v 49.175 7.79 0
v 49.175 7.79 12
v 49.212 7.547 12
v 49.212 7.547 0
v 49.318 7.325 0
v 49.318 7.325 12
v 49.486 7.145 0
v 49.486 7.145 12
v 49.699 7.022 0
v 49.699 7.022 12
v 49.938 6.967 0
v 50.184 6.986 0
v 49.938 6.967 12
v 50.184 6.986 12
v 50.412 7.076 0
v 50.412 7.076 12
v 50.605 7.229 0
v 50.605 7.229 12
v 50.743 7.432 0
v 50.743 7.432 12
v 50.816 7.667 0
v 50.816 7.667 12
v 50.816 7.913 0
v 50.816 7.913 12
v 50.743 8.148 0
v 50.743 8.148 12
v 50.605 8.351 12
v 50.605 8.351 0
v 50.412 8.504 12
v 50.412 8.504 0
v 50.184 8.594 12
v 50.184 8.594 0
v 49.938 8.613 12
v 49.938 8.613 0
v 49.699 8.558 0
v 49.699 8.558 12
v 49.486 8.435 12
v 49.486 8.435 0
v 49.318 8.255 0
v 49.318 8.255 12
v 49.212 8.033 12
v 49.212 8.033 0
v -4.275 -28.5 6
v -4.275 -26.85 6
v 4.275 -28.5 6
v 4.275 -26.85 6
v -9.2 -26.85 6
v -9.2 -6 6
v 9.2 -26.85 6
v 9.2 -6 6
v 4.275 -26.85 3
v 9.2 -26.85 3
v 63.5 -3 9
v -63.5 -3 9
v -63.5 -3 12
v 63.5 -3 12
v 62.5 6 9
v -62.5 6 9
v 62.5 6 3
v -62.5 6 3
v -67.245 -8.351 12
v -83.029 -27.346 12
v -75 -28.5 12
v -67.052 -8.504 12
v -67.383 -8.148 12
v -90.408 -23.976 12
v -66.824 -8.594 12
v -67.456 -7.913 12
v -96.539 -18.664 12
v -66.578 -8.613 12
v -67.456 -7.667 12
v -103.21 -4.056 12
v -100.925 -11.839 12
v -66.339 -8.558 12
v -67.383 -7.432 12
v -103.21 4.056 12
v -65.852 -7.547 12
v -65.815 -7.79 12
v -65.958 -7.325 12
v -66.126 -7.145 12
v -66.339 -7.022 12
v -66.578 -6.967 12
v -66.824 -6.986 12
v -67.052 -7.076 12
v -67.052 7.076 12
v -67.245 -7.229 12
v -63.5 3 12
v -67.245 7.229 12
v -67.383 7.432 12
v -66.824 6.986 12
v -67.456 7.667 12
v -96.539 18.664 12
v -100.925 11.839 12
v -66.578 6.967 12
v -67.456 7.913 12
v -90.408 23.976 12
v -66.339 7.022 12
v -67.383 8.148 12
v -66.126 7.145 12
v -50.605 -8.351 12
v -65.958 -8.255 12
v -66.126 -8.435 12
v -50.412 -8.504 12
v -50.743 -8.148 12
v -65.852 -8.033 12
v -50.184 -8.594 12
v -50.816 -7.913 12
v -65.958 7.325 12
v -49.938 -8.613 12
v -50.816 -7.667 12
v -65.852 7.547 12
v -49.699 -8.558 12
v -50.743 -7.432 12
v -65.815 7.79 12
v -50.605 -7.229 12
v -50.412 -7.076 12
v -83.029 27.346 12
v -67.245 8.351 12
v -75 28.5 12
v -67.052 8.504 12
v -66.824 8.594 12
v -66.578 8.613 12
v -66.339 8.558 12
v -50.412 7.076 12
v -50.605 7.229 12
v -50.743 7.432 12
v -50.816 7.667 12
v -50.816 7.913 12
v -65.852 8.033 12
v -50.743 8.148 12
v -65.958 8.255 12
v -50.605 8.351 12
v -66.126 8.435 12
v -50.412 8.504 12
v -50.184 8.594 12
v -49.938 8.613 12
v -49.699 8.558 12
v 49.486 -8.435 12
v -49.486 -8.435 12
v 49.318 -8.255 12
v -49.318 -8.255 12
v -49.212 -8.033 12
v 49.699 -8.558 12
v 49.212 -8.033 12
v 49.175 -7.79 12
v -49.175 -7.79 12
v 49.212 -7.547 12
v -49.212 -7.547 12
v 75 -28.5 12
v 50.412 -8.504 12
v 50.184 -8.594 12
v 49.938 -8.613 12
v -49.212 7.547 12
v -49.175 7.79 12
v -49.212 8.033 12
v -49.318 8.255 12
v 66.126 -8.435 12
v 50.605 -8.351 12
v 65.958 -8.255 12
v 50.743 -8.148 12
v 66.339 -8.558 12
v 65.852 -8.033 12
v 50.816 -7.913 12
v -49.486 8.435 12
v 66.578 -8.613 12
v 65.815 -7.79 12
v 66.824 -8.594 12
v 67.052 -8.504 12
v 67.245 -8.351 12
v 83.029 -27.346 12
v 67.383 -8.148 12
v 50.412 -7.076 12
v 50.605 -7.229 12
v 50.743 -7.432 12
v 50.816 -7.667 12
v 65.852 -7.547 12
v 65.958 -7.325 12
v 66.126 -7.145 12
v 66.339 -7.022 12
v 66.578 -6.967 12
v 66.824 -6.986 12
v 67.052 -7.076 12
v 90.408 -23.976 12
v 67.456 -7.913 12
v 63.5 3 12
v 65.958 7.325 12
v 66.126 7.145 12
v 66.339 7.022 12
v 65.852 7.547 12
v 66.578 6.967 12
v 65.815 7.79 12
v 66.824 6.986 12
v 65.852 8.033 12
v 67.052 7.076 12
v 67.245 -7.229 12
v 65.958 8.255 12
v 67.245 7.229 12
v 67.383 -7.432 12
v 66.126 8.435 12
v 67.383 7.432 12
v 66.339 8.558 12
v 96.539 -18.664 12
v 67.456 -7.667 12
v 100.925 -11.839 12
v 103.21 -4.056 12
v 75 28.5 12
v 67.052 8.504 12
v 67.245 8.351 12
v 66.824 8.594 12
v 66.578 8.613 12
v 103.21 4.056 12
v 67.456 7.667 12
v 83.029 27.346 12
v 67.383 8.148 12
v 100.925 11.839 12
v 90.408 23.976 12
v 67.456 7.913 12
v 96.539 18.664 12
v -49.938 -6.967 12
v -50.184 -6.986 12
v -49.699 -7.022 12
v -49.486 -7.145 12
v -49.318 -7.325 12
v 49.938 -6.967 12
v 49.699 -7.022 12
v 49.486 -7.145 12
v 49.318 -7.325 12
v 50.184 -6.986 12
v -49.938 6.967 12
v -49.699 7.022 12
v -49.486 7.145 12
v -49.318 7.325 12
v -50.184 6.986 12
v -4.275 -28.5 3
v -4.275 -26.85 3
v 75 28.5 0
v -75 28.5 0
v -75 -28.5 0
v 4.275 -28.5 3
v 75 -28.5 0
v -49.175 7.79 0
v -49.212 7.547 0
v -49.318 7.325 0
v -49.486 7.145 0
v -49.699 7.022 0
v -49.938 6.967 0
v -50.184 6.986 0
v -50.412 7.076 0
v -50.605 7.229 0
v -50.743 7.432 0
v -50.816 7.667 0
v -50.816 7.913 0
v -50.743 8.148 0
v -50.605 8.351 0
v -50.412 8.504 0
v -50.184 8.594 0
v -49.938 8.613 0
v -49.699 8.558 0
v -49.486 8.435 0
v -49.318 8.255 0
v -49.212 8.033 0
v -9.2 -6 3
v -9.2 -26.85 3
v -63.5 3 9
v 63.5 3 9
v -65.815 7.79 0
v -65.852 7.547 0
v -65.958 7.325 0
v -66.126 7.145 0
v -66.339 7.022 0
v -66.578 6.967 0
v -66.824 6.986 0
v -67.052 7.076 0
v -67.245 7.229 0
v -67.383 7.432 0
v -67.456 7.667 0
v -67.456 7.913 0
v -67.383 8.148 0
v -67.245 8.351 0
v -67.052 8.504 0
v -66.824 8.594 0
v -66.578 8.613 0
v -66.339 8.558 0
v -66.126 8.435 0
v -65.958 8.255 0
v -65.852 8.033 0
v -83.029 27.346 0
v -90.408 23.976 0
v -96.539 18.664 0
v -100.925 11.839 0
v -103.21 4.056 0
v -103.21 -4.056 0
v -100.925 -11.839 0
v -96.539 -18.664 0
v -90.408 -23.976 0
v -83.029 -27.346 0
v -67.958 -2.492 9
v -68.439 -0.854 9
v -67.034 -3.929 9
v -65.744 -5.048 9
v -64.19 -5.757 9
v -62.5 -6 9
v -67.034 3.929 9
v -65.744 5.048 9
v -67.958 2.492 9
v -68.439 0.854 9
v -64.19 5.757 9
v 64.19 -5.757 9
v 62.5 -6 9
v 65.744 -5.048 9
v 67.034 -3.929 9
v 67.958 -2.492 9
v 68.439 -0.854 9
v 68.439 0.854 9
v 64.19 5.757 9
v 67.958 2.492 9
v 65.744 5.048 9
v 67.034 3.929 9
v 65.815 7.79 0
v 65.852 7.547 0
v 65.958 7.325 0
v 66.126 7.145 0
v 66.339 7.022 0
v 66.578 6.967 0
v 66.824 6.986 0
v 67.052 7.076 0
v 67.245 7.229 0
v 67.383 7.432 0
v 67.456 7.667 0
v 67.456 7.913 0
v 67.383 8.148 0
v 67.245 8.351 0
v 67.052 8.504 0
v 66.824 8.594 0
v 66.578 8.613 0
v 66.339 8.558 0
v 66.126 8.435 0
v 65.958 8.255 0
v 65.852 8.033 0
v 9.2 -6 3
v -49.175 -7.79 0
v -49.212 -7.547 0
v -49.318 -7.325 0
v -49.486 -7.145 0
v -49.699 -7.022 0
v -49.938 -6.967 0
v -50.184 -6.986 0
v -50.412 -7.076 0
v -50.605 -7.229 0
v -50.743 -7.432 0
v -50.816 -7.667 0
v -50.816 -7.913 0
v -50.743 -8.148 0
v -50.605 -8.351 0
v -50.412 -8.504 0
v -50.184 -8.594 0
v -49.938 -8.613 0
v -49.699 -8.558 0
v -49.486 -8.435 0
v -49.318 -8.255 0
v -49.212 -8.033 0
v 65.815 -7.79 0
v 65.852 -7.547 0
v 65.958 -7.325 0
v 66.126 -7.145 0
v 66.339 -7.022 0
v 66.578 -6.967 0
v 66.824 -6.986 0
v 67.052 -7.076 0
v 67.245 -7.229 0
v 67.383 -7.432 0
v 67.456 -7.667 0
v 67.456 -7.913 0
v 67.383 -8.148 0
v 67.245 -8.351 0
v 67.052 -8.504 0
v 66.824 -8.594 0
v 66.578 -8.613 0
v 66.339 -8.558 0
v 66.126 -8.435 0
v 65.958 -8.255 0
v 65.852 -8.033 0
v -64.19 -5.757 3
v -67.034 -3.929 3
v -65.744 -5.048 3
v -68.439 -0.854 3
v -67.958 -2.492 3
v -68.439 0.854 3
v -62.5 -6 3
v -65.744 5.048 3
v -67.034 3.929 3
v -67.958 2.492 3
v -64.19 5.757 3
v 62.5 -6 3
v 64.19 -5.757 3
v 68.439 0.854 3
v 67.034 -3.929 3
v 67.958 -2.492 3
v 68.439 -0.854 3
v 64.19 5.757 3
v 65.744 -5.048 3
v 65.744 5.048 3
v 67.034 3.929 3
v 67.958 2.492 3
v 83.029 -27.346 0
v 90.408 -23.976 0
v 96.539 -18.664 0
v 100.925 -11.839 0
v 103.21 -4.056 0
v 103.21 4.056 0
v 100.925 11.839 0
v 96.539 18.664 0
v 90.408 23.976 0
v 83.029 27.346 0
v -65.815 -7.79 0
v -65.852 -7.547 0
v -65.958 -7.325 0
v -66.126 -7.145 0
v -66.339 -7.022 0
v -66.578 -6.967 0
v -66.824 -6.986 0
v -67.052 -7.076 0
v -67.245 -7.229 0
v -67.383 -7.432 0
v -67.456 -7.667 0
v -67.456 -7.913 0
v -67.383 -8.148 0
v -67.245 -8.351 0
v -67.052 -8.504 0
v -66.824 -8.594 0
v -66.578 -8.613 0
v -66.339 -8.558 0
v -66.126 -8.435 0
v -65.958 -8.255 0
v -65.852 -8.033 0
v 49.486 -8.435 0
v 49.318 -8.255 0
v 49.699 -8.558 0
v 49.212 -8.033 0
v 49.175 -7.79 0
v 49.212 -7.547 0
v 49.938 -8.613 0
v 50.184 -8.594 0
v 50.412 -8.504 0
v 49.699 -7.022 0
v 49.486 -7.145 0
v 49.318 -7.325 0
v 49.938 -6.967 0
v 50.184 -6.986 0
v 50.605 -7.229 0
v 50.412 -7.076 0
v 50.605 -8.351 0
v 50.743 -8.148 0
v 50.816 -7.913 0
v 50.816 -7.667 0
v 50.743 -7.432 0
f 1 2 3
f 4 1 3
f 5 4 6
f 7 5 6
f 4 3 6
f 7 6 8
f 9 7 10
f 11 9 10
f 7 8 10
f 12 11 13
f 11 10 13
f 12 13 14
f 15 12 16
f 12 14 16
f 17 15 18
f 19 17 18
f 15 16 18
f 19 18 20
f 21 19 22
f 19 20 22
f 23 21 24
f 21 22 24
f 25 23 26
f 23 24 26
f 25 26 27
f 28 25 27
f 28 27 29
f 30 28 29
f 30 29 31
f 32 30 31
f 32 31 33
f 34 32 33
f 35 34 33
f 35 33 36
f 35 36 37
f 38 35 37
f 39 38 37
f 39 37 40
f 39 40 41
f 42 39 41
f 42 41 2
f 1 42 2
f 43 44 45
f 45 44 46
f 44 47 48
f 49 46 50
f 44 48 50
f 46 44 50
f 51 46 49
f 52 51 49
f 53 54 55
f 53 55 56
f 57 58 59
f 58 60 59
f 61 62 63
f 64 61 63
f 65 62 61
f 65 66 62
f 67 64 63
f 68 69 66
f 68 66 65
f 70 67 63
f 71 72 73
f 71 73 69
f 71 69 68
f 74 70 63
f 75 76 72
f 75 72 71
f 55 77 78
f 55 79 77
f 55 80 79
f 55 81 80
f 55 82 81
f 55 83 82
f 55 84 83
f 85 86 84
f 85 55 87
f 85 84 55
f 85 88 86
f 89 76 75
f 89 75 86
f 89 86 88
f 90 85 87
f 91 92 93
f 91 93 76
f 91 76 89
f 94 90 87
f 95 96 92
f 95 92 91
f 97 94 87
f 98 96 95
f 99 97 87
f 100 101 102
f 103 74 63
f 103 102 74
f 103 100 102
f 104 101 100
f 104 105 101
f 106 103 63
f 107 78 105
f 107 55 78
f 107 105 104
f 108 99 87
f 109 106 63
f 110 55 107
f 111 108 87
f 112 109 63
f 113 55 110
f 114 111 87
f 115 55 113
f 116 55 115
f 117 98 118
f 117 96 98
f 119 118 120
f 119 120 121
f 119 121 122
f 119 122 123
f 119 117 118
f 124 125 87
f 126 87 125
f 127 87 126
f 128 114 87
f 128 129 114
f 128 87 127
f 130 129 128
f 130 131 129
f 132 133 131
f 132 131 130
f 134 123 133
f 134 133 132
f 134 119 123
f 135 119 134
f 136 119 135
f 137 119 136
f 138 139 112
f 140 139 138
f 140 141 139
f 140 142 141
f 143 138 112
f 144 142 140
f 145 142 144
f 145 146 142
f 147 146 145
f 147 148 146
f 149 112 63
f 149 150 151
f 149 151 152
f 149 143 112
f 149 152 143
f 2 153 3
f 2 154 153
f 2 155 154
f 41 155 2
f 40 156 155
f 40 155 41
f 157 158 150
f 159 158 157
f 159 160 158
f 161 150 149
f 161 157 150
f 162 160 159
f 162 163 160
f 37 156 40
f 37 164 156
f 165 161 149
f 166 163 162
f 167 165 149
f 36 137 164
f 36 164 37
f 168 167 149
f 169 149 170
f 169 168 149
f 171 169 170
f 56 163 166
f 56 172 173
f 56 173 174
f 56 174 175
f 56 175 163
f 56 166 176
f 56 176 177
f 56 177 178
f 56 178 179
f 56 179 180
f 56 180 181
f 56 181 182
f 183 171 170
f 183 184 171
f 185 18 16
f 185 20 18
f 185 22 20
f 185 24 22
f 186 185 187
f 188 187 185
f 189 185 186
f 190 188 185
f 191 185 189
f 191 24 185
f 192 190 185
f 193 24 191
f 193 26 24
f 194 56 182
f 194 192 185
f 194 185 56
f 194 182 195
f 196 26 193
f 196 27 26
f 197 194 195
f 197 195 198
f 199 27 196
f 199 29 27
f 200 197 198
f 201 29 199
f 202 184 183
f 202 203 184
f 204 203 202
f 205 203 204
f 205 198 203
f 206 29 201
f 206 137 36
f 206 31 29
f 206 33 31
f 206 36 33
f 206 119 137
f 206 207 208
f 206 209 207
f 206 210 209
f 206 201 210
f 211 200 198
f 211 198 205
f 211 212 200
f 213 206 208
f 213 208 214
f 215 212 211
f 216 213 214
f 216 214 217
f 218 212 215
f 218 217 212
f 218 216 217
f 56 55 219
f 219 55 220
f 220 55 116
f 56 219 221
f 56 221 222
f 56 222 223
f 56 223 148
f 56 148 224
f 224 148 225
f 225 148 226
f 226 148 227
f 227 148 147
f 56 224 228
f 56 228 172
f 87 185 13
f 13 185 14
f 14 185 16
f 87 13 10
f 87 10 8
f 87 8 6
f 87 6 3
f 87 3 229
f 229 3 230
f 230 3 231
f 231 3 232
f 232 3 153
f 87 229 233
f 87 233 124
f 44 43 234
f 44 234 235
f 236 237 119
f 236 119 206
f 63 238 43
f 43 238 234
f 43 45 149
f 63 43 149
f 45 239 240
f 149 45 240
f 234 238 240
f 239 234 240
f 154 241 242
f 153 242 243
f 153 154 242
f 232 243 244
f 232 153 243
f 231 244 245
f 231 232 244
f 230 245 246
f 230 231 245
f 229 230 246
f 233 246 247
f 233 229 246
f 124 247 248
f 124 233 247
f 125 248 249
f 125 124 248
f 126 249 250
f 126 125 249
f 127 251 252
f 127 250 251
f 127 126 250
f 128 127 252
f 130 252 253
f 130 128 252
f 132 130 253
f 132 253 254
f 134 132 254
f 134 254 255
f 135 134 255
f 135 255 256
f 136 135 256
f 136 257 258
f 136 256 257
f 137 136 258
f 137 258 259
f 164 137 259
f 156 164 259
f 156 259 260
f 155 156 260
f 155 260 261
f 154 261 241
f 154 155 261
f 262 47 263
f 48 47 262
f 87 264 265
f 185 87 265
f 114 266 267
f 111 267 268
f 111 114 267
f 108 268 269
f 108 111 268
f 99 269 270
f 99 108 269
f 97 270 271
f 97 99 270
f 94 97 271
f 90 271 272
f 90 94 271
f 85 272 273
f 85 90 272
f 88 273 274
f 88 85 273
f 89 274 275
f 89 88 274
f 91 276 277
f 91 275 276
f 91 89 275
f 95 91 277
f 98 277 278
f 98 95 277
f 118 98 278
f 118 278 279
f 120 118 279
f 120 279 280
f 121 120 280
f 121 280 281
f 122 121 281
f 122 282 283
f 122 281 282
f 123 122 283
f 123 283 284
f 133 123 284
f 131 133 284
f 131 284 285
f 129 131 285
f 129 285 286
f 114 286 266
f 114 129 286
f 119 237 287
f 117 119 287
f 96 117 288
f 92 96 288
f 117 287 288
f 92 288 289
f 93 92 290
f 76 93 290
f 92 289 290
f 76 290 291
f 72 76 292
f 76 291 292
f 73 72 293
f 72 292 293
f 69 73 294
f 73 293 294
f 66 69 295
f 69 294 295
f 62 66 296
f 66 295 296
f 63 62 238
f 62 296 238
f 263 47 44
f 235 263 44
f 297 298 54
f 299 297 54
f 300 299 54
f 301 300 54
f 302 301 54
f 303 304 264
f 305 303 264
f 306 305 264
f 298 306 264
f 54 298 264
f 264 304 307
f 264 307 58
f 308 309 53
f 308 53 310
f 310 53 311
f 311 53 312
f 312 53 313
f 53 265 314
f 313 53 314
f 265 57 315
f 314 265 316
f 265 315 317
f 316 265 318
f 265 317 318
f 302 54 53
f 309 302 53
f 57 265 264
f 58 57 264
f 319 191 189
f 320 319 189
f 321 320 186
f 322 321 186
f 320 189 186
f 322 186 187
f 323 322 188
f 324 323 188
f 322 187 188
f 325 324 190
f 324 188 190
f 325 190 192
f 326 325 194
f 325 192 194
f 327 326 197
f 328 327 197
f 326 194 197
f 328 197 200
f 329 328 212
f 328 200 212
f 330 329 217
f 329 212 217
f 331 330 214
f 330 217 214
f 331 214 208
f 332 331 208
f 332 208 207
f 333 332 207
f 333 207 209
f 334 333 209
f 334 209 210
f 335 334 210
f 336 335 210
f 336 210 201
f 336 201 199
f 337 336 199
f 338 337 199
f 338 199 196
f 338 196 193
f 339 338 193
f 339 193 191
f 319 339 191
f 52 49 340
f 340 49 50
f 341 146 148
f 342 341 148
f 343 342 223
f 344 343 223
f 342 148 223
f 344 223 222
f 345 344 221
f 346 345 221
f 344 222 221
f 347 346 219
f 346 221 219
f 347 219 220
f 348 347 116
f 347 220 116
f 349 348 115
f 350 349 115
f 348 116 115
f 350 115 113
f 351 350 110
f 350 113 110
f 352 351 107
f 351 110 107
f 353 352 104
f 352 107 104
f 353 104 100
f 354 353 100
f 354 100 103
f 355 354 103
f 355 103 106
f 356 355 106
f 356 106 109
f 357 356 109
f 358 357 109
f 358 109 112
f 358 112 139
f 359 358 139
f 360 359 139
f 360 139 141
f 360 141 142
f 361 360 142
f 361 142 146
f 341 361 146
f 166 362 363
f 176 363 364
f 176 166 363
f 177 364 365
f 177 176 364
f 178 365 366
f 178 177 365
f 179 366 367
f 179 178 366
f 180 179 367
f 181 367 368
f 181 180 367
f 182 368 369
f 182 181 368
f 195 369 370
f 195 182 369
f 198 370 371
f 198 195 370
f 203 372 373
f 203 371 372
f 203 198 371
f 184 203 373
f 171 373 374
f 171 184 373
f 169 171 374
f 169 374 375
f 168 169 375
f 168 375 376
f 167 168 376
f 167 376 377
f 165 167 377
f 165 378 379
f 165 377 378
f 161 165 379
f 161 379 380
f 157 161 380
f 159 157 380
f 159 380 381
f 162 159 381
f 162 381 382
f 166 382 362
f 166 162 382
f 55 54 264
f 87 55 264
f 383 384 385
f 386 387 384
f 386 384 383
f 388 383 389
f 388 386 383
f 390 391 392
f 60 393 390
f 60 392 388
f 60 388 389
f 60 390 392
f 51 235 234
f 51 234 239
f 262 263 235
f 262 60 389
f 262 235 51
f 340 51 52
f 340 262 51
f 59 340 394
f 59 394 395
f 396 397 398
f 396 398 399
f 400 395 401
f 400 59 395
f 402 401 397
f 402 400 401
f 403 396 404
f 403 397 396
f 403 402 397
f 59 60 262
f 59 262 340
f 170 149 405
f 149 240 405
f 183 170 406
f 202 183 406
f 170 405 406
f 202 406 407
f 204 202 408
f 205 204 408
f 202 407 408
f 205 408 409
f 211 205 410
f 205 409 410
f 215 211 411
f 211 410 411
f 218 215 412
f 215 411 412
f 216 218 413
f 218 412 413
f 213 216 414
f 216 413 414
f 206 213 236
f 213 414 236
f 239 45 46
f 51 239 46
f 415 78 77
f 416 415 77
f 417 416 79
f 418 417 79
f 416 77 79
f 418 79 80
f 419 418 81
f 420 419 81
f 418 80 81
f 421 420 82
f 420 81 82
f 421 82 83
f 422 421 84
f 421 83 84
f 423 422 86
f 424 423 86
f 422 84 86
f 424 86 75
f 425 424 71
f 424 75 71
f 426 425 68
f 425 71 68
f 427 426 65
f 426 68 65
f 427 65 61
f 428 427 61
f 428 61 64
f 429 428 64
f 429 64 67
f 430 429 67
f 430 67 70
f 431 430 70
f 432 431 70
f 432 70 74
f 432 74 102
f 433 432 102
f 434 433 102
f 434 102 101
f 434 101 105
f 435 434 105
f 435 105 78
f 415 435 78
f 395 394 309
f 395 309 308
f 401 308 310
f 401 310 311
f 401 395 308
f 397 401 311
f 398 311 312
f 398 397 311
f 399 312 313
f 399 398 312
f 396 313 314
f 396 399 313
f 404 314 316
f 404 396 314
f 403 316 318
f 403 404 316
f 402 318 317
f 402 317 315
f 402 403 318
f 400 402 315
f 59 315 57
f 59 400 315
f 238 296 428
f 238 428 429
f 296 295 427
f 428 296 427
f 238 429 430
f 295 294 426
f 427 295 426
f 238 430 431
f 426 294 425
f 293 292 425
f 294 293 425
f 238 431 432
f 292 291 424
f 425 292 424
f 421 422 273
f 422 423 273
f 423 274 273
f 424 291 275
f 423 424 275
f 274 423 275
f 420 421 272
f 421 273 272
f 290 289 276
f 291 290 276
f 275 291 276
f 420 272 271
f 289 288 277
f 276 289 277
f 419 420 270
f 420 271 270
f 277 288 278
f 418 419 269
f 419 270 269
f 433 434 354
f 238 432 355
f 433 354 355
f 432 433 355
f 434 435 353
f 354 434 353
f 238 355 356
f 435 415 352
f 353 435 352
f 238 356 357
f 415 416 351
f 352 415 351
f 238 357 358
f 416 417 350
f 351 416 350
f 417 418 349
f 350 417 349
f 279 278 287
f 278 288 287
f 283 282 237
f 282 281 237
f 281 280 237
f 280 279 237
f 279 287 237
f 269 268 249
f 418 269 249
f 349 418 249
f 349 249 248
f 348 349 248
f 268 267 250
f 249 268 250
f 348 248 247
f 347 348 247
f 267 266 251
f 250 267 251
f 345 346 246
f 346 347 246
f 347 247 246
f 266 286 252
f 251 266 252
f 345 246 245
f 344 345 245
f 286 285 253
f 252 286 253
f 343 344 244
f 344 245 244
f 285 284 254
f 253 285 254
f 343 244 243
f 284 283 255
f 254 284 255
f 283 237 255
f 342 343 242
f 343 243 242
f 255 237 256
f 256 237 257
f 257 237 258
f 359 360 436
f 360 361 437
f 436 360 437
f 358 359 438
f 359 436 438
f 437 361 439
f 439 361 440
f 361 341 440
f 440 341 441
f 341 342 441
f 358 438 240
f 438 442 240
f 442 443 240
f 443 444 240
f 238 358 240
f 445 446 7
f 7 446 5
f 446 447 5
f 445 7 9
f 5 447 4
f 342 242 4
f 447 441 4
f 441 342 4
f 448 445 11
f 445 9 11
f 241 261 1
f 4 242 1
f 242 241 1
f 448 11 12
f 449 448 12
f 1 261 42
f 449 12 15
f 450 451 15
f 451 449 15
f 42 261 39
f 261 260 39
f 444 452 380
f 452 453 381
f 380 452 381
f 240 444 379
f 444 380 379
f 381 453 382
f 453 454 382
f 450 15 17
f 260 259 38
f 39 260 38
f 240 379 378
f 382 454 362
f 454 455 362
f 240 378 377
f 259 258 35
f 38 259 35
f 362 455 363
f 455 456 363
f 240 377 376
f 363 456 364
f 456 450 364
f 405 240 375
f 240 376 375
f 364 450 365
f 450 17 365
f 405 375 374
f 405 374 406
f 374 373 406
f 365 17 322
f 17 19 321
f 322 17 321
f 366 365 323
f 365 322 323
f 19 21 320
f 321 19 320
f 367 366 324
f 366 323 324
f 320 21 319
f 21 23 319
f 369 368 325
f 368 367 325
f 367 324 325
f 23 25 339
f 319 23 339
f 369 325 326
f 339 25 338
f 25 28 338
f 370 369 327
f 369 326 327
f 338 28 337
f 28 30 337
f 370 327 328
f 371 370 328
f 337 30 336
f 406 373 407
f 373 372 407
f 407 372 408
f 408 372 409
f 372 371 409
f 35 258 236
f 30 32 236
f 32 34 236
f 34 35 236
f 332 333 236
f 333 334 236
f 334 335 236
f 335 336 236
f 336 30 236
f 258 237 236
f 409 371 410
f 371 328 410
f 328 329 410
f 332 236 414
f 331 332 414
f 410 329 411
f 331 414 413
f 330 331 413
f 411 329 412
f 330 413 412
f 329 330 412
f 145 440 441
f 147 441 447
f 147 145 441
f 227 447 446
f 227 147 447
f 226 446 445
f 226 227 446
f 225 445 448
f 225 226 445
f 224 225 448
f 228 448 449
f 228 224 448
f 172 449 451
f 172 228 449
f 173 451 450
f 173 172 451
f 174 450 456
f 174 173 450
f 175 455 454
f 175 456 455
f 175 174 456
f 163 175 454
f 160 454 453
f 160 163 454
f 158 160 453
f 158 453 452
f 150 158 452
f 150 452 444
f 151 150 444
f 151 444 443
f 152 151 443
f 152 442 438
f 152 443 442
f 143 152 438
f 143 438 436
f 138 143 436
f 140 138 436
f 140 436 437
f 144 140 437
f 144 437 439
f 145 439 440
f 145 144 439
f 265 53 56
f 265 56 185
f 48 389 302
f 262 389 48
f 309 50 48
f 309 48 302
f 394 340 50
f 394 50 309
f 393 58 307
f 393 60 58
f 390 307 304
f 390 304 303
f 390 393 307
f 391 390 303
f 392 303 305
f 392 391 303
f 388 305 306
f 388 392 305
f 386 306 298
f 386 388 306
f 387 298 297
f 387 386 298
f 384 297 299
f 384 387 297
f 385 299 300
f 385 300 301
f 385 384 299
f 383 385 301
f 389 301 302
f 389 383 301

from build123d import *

# Parameters (mm, degrees)
PAD_DEPTH          = 6
POCKET_DEPTH       = 3
SKETCH002_W        = 18.4
SKETCH002_H        = 20.85
POCKET001_DEPTH    = 3
SKETCH003_W        = 8.55
SKETCH003_H        = 1.65
POCKET002_DEPTH    = 3
PAD001_DEPTH       = 3
SKETCH005_W        = 127
SKETCH005_H        = 6
PAD002_DEPTH       = 3
SKETCH006_R        = 0.825
POCKET003_DEPTH    = 442.080062
POLARPATTERN_COUNT = 2


with BuildPart() as part:
    # Sketch → Pad (new body)
    with BuildSketch(Plane.XY):
        with BuildLine():
            ThreePointArc((-75, 28.5), (-103.5, 0), (-75, -28.5))
            Line((-75, -28.5), (75, -28.5))
            ThreePointArc((75, -28.5), (103.5, 0), (75, 28.5))
            Line((-75, 28.5), (75, 28.5))
        make_face()
    extrude(amount=PAD_DEPTH)

    # Sketch001 (on Face6 of Pad) → Pocket (cut)
    with BuildSketch(Plane.XY.offset(6)):
        with BuildLine():
            ThreePointArc((-62.5, 6), (-68.5, 0), (-62.5, -6))
            Line((-62.5, -6), (62.5, -6))
            ThreePointArc((62.5, -6), (68.5, 0), (62.5, 6))
            Line((-62.5, 6), (62.5, 6))
        make_face()
    extrude(amount=-POCKET_DEPTH, mode=Mode.SUBTRACT)

    # Sketch002 (on Face5 of Pocket) → Pocket001 (cut)
    with BuildSketch(Plane.XY.offset(6)):
        with Locations((0, -16.425)):
            Rectangle(SKETCH002_W, SKETCH002_H)
    extrude(amount=-POCKET001_DEPTH, mode=Mode.SUBTRACT)

    # Sketch003 (on Face5 of Pocket001) → Pocket002 (cut)
    with BuildSketch(Plane.XY.offset(6)):
        with Locations((0, -27.675)):
            Rectangle(SKETCH003_W, SKETCH003_H)
    extrude(amount=-POCKET002_DEPTH, mode=Mode.SUBTRACT)

    # Sketch004 (on Face5 of Pocket002) → Pad001 (join)
    with BuildSketch(Plane.XY.offset(6)):
        with BuildLine():
            ThreePointArc((-75, 28.5), (-103.5, 0), (-75, -28.5))
            Line((-75, -28.5), (75, -28.5))
            ThreePointArc((75, -28.5), (103.5, 0), (75, 28.5))
            Line((-75, 28.5), (75, 28.5))
        make_face()
        with BuildLine():
            ThreePointArc((-62.5, 6), (-68.5, 0), (-62.5, -6))
            Line((-62.5, -6), (62.5, -6))
            ThreePointArc((62.5, -6), (68.5, 0), (62.5, 6))
            Line((-62.5, 6), (62.5, 6))
        make_face(mode=Mode.SUBTRACT)
    extrude(amount=PAD001_DEPTH)

    # Sketch005 (on Face12 of Pad001) → Pad002 (join)
    with BuildSketch(Plane.XY.offset(9)):
        with BuildLine():
            ThreePointArc((-75, 28.5), (-103.5, 0), (-75, -28.5))
            Line((-75, -28.5), (75, -28.5))
            ThreePointArc((75, -28.5), (103.5, 0), (75, 28.5))
            Line((-75, 28.5), (75, 28.5))
        make_face()
        Rectangle(SKETCH005_W, SKETCH005_H, mode=Mode.SUBTRACT)
    extrude(amount=PAD002_DEPTH)

    # Sketch006 (on Face20 of Pad002) → Pocket003 (cut, through all)
    with BuildSketch(Plane.XY.offset(12)):
        with Locations((-66.64, -7.79)):
            Circle(SKETCH006_R)
        with Locations((-50, -7.79)):
            Circle(SKETCH006_R)
    pocket003 = extrude(amount=-POCKET003_DEPTH, mode=Mode.SUBTRACT)

    # Mirrored: Pocket003 across Sketch006 H_Axis
    add(pocket003.mirror(Plane(origin=(0, 0, 12), x_dir=(0, 0, 1), z_dir=(0, 1, 0))), mode=Mode.SUBTRACT)

    # Mirrored001: Pocket003 across Sketch006 V_Axis
    add(pocket003.mirror(Plane(origin=(0, 0, 12), x_dir=(0, 0, 1), z_dir=(1, 0, 0))), mode=Mode.SUBTRACT)

    # PolarPattern: Pocket003 ×2 about axis
    polarpattern_axis = Axis((0, 0, 12), (0, 0, 1))
    for i in range(1, POLARPATTERN_COUNT):
        add(pocket003.rotate(polarpattern_axis, i * 360 / POLARPATTERN_COUNT), mode=Mode.SUBTRACT)


solid = part.part
